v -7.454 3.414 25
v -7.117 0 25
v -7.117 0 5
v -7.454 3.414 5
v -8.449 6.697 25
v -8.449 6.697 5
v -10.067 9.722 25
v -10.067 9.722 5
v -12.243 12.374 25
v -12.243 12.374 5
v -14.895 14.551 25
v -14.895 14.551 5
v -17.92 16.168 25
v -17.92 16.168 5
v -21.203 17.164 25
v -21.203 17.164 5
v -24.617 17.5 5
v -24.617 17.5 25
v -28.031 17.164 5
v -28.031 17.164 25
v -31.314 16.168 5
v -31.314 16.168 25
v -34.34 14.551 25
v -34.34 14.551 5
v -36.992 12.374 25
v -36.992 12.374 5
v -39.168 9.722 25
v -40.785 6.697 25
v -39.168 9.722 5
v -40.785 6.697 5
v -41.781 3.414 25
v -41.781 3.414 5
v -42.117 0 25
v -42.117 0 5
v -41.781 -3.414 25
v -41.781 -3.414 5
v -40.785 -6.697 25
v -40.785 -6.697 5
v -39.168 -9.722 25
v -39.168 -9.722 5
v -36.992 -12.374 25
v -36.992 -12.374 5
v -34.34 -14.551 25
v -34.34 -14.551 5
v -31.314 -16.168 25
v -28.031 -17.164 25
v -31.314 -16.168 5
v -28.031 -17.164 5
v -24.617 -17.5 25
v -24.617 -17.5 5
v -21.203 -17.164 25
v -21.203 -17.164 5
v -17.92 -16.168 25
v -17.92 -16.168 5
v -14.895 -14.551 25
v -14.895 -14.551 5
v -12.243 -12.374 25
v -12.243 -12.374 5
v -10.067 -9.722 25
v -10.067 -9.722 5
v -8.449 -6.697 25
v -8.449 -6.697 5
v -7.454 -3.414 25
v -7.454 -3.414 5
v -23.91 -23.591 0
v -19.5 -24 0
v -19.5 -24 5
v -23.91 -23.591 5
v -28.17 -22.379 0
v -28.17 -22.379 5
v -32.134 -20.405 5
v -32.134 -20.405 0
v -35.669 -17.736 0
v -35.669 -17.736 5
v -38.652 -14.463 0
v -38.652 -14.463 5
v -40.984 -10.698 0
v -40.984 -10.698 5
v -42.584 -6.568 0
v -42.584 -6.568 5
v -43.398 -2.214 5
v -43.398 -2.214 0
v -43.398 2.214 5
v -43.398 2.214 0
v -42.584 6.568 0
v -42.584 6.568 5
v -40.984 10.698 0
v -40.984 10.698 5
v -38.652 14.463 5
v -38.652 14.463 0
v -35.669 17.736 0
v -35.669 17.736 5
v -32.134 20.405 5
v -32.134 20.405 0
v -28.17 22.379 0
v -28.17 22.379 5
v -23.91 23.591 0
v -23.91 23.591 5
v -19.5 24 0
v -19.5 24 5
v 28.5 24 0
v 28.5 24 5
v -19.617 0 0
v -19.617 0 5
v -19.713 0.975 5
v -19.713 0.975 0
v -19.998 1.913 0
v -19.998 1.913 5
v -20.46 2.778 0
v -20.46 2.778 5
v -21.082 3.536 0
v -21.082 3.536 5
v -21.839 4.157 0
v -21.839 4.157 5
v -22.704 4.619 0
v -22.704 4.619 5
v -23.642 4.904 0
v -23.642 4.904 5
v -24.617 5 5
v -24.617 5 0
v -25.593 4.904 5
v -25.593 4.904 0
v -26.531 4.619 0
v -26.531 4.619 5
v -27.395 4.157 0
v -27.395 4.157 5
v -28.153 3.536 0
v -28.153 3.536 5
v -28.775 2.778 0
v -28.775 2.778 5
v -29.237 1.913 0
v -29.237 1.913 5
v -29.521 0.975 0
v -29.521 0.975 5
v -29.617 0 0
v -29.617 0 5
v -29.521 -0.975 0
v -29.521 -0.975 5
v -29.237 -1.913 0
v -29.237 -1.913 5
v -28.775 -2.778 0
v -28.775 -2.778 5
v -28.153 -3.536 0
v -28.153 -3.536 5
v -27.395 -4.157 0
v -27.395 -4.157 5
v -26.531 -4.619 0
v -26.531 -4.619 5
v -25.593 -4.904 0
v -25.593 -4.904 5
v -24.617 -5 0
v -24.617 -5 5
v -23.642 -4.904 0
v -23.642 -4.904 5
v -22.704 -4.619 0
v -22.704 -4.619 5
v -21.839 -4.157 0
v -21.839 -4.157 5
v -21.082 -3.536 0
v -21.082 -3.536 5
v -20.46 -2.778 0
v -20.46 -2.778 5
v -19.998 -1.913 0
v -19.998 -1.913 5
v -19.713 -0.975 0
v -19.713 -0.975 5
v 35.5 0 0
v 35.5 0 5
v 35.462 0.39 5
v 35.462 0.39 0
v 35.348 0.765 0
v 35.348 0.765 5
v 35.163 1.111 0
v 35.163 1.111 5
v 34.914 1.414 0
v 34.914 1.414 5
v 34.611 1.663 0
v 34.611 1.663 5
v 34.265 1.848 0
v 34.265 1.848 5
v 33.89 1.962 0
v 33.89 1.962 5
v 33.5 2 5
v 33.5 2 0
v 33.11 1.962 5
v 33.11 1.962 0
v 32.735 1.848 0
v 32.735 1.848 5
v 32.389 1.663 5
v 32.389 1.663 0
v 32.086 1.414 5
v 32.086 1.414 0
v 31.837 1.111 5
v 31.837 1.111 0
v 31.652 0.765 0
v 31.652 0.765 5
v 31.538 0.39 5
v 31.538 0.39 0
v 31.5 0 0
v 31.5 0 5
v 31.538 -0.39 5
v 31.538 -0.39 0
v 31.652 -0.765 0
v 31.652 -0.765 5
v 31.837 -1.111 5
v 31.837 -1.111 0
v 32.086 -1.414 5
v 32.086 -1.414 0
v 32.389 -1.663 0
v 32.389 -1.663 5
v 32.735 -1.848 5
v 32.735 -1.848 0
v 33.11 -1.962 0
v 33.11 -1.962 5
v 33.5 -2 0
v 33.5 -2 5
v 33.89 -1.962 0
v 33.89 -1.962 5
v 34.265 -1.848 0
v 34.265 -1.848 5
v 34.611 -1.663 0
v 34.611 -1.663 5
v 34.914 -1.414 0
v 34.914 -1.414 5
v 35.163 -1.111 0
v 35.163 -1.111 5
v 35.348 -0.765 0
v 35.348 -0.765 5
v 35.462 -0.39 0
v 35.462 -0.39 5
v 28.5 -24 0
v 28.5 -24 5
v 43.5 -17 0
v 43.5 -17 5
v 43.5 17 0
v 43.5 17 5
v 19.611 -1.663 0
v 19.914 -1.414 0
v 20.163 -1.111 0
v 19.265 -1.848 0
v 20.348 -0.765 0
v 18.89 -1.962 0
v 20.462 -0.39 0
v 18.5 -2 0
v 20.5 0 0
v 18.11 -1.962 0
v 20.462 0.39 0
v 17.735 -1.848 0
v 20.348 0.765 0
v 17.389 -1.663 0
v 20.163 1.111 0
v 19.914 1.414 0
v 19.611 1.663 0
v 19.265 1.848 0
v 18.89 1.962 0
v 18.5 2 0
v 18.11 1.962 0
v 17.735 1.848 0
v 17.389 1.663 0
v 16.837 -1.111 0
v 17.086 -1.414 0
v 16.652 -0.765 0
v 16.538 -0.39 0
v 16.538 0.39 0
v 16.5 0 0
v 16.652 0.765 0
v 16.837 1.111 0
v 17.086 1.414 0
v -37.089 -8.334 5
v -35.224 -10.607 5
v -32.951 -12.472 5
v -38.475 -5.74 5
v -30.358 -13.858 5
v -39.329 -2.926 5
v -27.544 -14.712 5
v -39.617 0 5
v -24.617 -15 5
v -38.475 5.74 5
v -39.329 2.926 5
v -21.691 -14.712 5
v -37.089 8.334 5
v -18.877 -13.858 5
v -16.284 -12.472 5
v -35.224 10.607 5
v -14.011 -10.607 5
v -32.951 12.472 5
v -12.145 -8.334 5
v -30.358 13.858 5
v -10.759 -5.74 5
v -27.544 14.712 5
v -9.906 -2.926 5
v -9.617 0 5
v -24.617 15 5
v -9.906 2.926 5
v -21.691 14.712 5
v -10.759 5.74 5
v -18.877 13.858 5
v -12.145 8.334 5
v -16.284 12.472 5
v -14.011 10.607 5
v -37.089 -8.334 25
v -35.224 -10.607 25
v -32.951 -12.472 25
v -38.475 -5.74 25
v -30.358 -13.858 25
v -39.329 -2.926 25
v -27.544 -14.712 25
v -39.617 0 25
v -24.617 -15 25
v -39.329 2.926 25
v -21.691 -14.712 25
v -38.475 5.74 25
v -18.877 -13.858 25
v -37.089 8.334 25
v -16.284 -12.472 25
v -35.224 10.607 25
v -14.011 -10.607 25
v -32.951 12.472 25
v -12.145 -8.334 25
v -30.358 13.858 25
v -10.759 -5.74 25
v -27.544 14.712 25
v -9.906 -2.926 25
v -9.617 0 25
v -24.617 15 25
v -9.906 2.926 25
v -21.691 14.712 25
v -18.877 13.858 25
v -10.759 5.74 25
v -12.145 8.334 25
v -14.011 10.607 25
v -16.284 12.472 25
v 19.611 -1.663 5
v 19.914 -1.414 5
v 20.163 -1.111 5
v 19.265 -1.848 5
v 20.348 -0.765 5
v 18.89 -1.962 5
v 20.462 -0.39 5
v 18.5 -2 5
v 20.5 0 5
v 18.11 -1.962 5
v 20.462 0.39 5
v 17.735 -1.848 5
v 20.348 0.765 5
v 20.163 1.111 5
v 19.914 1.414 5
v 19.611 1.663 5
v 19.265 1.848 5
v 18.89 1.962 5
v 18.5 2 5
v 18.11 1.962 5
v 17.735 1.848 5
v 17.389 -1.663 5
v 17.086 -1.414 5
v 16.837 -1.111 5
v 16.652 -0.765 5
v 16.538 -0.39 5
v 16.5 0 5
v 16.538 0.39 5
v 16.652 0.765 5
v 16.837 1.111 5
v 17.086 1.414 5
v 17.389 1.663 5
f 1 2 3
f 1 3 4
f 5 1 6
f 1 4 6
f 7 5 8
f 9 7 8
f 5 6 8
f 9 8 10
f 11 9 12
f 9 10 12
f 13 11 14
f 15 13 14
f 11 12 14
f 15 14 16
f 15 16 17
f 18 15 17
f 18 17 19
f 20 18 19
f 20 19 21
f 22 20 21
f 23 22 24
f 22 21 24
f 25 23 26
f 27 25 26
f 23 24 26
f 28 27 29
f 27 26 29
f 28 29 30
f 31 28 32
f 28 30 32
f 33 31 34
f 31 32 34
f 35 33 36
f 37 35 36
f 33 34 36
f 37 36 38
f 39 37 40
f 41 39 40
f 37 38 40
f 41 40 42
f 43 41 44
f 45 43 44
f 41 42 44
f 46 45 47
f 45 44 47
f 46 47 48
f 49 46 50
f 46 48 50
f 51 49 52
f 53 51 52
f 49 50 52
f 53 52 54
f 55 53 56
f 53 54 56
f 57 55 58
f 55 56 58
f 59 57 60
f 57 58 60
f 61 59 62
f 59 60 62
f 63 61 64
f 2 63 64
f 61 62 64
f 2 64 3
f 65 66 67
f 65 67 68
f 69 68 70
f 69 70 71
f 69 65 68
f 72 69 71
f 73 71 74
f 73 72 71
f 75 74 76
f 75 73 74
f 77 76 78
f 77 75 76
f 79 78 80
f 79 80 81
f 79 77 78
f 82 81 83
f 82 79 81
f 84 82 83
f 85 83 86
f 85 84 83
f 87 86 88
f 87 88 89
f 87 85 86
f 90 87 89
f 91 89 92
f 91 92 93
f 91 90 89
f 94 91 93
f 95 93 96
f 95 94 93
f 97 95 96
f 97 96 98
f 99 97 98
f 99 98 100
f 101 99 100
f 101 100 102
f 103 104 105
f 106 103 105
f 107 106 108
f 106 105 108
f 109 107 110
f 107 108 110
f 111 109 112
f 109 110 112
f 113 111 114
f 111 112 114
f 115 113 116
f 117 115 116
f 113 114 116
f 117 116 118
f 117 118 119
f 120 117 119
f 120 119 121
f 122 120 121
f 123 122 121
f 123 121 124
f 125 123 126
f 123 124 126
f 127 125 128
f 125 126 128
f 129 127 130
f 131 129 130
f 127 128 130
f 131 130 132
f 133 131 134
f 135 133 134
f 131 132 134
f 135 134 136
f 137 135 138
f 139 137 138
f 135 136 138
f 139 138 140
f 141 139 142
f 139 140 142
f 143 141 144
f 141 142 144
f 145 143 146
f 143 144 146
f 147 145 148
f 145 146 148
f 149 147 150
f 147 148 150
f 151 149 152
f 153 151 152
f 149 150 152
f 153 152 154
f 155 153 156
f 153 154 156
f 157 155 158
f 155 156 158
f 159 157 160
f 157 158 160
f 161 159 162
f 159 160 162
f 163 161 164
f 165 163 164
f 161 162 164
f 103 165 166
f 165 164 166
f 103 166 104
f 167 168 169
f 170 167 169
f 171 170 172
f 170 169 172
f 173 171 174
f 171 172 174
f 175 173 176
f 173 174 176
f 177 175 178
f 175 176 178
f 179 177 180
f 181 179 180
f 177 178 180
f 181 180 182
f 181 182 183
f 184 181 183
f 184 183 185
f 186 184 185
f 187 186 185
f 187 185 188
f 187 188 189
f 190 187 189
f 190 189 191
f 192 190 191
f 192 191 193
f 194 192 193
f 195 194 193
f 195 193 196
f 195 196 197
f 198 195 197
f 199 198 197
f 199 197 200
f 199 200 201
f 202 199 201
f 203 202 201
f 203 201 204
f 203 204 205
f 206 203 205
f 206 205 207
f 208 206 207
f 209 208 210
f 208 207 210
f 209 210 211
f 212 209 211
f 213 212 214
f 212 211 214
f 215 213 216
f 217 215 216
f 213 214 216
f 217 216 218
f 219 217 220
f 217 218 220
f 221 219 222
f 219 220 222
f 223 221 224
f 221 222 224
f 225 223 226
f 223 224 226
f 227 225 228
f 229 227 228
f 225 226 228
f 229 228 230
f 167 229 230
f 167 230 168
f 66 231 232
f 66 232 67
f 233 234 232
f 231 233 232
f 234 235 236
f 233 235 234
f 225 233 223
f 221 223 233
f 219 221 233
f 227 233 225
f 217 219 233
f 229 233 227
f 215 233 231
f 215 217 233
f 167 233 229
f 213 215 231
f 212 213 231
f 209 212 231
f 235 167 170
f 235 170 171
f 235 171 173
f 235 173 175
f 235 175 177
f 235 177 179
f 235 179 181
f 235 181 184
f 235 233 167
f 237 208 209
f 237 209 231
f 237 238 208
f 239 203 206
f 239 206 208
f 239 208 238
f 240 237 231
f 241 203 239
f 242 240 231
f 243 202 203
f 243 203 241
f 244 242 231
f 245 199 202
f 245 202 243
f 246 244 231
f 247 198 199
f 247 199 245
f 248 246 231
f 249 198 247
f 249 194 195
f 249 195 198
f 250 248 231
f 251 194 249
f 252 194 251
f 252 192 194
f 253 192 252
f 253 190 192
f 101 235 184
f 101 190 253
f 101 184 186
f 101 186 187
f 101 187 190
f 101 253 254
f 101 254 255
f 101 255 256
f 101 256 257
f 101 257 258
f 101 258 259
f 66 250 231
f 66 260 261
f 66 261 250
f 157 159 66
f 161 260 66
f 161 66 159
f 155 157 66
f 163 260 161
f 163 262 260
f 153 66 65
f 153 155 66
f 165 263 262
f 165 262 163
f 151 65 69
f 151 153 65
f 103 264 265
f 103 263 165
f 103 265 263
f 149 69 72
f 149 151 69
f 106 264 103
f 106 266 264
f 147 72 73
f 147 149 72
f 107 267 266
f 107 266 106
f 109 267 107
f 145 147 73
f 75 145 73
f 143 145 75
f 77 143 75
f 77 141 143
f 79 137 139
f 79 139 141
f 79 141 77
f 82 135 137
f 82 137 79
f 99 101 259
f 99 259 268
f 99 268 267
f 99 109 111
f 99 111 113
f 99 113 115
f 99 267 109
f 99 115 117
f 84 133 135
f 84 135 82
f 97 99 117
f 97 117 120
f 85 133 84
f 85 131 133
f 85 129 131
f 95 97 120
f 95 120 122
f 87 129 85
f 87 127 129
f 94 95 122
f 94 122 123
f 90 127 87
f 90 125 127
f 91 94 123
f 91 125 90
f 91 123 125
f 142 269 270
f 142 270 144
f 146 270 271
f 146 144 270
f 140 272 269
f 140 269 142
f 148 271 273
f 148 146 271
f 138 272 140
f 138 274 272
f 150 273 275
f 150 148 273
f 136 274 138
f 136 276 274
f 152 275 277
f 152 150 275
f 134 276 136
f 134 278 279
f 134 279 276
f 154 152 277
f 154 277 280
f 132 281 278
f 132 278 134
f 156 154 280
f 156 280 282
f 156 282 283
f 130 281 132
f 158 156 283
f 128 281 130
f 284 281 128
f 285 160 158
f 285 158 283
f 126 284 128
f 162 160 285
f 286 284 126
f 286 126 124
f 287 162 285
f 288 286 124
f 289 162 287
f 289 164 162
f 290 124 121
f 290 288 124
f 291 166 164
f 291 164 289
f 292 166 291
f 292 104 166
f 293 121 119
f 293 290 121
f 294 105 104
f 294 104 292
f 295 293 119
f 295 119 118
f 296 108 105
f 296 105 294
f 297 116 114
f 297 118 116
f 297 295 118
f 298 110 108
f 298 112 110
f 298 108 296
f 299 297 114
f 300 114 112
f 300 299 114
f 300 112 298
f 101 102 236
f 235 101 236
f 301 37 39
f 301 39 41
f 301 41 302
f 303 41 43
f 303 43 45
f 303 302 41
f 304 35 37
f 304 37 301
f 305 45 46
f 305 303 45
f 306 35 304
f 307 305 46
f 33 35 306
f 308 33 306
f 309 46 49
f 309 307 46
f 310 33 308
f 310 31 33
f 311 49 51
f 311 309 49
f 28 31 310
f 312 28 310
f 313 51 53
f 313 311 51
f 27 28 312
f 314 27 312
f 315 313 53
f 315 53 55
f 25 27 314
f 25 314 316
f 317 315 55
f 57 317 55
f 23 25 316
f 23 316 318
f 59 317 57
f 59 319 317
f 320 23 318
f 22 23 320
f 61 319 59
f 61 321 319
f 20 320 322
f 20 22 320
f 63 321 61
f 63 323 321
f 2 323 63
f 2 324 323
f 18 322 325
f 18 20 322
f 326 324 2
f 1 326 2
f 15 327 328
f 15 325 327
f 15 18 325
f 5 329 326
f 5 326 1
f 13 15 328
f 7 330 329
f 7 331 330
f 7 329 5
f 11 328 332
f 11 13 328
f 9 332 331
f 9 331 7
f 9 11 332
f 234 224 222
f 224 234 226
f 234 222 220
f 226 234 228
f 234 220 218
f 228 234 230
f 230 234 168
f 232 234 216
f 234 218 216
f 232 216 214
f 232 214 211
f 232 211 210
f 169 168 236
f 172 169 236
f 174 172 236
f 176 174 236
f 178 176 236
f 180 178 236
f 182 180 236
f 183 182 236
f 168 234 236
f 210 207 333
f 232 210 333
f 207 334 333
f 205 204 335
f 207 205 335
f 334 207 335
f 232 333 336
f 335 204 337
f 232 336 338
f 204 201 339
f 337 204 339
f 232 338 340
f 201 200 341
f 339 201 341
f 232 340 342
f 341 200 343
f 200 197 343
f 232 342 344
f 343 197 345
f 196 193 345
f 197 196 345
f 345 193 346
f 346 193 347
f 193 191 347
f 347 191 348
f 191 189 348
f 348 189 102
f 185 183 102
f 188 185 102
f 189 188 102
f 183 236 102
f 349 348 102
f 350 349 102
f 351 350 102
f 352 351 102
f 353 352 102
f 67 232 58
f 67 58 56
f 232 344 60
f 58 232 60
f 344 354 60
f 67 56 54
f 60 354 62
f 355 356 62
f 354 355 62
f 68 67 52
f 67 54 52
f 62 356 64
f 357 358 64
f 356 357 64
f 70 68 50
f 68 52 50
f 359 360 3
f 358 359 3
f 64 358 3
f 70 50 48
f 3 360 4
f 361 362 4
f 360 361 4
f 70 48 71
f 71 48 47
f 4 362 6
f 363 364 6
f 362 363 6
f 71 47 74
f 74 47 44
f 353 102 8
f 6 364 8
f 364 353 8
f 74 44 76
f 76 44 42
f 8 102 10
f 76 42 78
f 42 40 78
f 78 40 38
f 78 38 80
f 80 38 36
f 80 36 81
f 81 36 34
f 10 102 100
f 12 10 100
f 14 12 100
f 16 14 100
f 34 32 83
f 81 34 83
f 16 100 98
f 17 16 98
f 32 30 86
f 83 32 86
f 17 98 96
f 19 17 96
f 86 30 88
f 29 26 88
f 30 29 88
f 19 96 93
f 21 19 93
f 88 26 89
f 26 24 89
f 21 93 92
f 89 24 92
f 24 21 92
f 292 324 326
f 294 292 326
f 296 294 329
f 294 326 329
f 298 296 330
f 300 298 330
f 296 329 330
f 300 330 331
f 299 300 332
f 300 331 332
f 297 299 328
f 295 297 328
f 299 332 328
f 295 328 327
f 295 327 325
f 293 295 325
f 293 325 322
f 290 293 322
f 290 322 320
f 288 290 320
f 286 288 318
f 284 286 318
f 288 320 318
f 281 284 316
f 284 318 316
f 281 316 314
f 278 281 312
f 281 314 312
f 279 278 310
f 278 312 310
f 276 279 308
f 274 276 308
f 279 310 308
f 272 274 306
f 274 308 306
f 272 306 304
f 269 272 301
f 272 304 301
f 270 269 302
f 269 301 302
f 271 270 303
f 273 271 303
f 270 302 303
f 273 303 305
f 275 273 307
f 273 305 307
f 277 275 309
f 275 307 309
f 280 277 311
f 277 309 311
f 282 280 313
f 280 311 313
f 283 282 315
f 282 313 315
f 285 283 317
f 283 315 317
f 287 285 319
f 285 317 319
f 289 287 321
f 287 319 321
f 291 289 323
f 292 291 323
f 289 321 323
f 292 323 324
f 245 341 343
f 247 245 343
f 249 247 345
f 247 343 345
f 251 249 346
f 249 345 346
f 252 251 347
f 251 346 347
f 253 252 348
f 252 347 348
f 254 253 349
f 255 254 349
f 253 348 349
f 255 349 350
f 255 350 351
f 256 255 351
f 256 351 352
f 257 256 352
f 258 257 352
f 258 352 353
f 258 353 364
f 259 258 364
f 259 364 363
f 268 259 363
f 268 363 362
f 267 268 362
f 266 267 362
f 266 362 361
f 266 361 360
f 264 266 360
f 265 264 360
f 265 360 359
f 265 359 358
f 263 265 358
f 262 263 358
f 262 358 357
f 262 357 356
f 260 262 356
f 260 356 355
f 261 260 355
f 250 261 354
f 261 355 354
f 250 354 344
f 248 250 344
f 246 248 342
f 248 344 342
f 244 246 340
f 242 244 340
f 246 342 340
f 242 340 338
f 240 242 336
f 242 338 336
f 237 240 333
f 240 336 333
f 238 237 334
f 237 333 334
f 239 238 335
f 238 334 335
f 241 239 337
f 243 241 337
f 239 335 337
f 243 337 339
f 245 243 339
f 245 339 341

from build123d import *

# Parameters (mm, degrees)
BOSS_EXTRUDE2_DEPTH = 5
SKETCH2_R           = 2
CUT_EXTRUDE1_DEPTH  = 50.932454376
SKETCH3_R           = 5
CUT_EXTRUDE2_DEPTH  = 5
CUT_EXTRUDE5_DEPTH  = 50.932454376
SKETCH10_R          = 17.5
BOSS_EXTRUDE5_DEPTH = 20
SKETCH11_R          = 15
CUT_EXTRUDE6_DEPTH  = 20


with BuildPart() as part:
    # Sketch1 → Boss-Extrude2 (new body)
    with BuildSketch(Plane.XY):
        with BuildLine():
            Line((-19.5, 24), (43.5, 24))
            Line((43.5, 24), (43.5, -24))
            Line((43.5, -24), (-19.5, -24))
            ThreePointArc((-19.5, -24), (-43.5, 0), (-19.5, 24))
        make_face()
    extrude(amount=BOSS_EXTRUDE2_DEPTH)

    # Sketch2 → Cut-Extrude1 (cut, through all)
    with BuildSketch(Plane.XY.offset(5)):
        with Locations((33.5, 0)):
            Circle(SKETCH2_R)
        with Locations((18.5, 0)):
            Circle(SKETCH2_R)
    extrude(amount=-CUT_EXTRUDE1_DEPTH, mode=Mode.SUBTRACT)

    # Sketch3 → Cut-Extrude2 (cut)
    with BuildSketch(Plane.XY.offset(5)):
        with Locations((-24.61729874, 0)):
            Circle(SKETCH3_R)
    extrude(amount=-CUT_EXTRUDE2_DEPTH, mode=Mode.SUBTRACT)

    # Sketch9 → Cut-Extrude5 (cut, through all)
    with BuildSketch(Plane.XY.offset(5)):
        Polygon((28.5, 24), (43.5, 17), (43.5, 24), align=None)
        Polygon((43.5, -17), (28.5, -24), (43.5, -24), align=None)
    extrude(amount=-CUT_EXTRUDE5_DEPTH, mode=Mode.SUBTRACT)

    # Sketch10 → Boss-Extrude5 (add)
    with BuildSketch(Plane.XY.offset(5)):
        with Locations((-24.61729874, 0)):
            Circle(SKETCH10_R)
    extrude(amount=BOSS_EXTRUDE5_DEPTH)

    # Sketch11 → Cut-Extrude6 (cut)
    with BuildSketch(Plane.XY.offset(25)):
        with Locations((-24.61729874, 0)):
            Circle(SKETCH11_R)
    extrude(amount=-CUT_EXTRUDE6_DEPTH, mode=Mode.SUBTRACT)


solid = part.part
